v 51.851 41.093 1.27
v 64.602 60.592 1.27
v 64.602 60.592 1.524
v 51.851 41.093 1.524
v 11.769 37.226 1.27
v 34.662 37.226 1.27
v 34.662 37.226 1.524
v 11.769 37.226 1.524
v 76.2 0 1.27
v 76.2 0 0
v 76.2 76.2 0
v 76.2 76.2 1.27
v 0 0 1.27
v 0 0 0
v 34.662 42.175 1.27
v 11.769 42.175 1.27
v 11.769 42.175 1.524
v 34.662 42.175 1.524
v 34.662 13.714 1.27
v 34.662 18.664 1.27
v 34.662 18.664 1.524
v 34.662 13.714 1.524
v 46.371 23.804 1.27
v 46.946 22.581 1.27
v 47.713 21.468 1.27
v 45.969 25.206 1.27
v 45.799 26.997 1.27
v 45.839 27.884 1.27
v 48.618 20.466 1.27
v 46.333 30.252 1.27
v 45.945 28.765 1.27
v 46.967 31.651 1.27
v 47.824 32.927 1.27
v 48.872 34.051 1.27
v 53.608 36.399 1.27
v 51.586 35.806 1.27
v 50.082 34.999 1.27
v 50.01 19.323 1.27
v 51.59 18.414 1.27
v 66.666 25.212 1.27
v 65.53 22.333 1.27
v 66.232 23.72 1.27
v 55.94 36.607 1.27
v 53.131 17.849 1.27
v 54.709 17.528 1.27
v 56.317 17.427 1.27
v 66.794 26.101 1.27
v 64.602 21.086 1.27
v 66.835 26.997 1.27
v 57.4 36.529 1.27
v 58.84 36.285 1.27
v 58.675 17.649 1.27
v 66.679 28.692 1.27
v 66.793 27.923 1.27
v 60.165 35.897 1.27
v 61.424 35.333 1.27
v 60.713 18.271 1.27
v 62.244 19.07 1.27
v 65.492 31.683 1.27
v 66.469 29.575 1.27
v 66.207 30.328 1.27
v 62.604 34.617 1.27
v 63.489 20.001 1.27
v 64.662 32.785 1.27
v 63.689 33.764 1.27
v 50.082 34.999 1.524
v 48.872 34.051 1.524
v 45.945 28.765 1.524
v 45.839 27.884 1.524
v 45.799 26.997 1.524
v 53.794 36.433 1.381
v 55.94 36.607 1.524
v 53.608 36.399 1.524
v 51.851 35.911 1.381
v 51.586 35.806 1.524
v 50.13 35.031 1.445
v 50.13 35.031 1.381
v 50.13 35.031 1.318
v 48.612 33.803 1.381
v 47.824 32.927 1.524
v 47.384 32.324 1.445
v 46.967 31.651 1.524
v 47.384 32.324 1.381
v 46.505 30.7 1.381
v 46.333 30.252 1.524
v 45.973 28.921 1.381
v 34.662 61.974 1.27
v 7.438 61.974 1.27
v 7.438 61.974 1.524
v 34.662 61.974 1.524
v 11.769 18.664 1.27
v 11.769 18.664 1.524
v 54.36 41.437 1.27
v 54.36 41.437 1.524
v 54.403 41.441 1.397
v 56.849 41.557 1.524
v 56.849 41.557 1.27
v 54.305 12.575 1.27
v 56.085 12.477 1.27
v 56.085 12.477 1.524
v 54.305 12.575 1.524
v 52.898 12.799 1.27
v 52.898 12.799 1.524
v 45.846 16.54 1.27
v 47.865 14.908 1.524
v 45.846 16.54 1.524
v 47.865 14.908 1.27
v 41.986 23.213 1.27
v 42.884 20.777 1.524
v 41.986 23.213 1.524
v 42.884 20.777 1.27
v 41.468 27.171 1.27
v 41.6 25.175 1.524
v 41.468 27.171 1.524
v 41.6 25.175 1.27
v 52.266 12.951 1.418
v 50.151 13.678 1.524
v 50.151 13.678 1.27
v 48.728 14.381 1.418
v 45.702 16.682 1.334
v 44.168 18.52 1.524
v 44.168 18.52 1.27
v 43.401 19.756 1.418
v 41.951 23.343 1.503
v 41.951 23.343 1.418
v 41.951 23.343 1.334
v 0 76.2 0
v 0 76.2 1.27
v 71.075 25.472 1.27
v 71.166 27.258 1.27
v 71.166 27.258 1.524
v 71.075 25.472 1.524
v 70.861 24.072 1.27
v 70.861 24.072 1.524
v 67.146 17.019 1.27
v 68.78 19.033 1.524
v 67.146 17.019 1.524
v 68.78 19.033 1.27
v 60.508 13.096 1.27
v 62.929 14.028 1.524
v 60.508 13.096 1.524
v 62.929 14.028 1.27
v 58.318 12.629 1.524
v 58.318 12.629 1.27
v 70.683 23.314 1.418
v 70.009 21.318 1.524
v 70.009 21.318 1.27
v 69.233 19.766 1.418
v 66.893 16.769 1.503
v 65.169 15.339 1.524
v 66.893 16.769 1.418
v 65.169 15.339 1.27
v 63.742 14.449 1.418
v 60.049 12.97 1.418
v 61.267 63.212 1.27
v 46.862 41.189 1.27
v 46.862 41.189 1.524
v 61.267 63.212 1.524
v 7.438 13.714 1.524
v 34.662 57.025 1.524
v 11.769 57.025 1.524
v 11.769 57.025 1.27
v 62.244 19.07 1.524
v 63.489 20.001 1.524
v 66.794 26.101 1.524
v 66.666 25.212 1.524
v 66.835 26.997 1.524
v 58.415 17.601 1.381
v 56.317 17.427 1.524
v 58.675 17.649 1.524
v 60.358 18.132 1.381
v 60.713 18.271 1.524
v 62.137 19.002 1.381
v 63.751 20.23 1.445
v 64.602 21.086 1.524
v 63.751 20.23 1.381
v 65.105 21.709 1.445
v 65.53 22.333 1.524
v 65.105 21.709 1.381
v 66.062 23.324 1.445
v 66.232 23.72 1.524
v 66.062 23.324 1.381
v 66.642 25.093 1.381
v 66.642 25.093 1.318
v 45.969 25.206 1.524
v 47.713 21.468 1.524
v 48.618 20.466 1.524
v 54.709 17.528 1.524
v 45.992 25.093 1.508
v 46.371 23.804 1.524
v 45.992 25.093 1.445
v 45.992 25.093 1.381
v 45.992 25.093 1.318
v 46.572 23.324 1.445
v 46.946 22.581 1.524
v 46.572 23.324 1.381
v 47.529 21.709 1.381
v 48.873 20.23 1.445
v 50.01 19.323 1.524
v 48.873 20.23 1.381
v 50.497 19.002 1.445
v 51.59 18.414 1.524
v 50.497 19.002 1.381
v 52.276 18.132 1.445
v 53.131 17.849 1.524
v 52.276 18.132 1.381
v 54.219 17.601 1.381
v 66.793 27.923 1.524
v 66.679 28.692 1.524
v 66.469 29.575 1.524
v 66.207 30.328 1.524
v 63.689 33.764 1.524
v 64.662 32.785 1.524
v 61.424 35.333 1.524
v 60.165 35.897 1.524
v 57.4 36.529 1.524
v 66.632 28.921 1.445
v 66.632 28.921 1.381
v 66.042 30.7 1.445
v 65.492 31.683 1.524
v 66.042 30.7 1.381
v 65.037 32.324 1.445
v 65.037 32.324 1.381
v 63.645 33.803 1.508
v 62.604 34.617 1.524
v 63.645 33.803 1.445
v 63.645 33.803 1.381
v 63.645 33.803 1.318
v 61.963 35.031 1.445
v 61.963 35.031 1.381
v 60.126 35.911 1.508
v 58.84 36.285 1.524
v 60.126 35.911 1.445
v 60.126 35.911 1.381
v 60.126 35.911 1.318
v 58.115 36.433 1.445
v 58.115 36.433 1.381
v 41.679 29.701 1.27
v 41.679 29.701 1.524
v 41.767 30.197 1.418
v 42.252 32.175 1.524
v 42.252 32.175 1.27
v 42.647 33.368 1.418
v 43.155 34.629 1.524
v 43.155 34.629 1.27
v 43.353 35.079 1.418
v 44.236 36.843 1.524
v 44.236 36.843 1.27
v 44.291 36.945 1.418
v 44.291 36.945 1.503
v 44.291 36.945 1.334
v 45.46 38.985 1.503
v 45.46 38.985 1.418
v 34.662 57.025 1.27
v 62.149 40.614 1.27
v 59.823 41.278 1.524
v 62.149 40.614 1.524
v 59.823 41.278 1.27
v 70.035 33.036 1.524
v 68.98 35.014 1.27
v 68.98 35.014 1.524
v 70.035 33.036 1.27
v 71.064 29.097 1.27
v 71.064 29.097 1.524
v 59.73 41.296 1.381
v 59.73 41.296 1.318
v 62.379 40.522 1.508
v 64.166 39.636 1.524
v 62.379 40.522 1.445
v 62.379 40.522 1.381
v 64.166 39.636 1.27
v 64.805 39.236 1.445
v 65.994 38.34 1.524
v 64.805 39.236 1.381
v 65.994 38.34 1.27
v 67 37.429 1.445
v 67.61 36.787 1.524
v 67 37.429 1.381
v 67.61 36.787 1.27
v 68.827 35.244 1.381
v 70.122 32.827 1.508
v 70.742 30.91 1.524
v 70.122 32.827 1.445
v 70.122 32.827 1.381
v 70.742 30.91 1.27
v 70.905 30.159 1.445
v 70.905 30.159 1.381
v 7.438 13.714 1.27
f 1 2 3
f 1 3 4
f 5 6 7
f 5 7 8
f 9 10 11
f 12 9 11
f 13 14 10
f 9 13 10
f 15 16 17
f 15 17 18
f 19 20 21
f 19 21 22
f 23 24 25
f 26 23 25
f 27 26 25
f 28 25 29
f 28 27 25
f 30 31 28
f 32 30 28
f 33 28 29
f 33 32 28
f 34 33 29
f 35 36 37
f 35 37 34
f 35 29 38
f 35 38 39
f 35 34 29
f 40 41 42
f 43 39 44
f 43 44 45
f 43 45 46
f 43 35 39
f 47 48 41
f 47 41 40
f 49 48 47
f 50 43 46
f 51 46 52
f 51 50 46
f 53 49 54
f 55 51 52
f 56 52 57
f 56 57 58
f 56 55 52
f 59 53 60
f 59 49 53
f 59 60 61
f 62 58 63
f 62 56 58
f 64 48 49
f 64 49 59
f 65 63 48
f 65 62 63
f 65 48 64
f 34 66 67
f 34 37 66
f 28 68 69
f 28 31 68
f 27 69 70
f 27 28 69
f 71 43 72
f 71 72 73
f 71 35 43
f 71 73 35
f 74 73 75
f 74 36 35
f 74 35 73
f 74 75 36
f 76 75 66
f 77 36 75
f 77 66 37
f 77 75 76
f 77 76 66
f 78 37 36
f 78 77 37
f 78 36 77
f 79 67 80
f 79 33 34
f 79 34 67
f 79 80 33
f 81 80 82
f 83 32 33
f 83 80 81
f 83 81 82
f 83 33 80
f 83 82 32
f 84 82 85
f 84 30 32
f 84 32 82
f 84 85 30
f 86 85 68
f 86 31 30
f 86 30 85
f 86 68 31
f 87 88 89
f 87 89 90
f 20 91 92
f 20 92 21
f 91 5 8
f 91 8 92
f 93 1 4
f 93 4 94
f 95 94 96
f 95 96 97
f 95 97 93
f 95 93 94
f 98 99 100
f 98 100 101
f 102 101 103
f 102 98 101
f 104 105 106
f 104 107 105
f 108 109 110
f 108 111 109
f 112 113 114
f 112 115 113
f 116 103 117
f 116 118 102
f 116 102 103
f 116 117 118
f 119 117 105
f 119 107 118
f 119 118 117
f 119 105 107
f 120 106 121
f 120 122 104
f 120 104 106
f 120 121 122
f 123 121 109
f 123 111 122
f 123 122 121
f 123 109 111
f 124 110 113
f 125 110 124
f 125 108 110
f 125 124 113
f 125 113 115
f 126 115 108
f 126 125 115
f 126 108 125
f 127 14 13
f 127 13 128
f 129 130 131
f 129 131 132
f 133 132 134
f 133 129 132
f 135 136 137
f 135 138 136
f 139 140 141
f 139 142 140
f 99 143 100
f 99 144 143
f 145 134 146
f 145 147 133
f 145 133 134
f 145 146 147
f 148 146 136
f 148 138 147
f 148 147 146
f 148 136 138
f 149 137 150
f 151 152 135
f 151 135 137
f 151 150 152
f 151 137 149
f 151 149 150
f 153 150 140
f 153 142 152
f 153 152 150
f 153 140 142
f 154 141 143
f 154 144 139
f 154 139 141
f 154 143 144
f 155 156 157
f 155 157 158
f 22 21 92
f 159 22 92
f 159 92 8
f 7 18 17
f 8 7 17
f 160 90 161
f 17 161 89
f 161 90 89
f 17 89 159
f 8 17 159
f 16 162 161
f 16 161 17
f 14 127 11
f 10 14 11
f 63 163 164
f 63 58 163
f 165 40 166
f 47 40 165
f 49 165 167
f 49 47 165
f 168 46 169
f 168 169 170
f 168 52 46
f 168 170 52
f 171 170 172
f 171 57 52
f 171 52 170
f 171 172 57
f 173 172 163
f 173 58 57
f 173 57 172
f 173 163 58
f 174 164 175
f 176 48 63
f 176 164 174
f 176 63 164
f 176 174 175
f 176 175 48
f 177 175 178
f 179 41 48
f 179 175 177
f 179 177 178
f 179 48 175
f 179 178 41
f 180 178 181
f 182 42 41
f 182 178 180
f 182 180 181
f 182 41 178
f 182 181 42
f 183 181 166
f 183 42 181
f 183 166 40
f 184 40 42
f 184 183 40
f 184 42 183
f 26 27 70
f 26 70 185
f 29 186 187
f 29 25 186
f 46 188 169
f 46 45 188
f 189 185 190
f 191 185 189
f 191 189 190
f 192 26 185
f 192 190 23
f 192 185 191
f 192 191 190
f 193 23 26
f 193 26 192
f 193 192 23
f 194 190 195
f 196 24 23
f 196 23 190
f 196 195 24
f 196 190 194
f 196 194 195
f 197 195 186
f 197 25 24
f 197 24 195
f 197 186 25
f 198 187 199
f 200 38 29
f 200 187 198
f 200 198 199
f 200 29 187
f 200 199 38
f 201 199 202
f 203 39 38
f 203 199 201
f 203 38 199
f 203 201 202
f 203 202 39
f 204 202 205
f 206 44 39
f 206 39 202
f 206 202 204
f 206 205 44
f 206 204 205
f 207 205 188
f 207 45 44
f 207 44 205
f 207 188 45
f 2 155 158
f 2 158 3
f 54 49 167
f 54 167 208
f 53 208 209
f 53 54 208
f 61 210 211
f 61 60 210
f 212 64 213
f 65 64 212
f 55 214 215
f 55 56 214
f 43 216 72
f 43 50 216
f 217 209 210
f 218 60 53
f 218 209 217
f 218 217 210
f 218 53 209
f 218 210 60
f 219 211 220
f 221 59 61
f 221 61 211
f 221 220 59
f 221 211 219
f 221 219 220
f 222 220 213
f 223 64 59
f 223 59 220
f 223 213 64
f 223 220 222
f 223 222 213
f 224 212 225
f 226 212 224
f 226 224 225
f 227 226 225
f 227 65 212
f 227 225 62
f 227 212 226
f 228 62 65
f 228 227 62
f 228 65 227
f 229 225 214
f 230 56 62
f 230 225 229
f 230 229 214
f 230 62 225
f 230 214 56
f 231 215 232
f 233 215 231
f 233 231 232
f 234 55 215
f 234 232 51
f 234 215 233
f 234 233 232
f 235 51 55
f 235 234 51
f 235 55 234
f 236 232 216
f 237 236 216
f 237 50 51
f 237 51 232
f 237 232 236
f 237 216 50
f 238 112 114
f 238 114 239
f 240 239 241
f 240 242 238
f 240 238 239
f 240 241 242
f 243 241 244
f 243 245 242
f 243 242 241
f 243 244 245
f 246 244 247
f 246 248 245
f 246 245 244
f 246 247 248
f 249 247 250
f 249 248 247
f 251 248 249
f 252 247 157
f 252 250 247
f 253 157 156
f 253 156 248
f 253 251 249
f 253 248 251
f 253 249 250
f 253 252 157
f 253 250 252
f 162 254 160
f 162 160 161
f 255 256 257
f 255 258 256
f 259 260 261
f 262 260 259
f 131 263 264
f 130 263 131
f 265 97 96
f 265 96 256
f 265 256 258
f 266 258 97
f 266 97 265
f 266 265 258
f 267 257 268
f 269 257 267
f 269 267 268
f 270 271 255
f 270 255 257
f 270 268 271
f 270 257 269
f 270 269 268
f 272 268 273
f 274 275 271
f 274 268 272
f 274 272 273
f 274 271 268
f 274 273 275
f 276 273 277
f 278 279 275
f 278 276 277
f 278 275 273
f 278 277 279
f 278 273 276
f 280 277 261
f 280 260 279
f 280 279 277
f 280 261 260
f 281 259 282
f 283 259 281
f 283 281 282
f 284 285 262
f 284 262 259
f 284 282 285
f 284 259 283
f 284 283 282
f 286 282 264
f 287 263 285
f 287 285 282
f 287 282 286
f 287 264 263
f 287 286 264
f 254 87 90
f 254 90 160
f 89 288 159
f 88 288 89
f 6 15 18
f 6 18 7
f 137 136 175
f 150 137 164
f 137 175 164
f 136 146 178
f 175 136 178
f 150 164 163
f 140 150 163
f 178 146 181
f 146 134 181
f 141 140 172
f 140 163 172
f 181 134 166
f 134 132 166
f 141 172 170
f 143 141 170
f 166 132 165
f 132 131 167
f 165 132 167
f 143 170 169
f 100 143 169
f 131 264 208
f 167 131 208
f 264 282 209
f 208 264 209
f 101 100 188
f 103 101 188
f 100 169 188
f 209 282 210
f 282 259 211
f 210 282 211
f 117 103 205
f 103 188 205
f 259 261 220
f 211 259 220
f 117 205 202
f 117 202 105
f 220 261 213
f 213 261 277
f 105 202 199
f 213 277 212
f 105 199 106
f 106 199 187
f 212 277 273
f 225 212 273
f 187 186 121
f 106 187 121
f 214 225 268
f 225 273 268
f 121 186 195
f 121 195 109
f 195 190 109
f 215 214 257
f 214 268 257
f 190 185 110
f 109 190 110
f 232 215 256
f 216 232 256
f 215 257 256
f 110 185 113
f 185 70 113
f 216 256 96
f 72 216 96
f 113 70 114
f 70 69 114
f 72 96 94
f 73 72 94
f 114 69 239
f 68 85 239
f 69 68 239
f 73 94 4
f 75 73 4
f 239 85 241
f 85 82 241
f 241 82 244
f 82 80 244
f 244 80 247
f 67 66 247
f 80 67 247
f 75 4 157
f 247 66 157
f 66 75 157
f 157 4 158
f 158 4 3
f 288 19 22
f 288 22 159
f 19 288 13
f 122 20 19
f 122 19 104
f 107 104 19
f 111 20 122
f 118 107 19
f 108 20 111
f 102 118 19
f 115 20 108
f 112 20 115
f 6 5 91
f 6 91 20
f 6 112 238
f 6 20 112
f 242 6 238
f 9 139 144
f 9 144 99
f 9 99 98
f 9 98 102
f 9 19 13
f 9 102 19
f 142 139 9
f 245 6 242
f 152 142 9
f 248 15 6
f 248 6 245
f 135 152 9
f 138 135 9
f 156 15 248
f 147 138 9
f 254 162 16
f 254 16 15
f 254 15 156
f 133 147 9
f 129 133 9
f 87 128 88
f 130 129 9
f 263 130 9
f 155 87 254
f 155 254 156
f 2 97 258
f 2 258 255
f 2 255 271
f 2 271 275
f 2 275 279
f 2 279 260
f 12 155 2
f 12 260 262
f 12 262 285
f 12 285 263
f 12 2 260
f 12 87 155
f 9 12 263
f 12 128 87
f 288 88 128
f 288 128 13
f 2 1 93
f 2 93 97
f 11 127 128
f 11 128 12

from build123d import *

# Parameters (mm, degrees)
SKETCH1_W           = 76.2
SKETCH1_H           = 76.2
BOSS_EXTRUDE1_DEPTH = 1.27
BOSS_EXTRUDE2_DEPTH = 0.254


with BuildPart() as part:
    # Sketch1 → Boss-Extrude1 (new body)
    with BuildSketch(Plane.XY):
        with Locations((38.1, 38.1)):
            Rectangle(SKETCH1_W, SKETCH1_H)
    extrude(amount=BOSS_EXTRUDE1_DEPTH)

    # Sketch2 → Boss-Extrude2 (add)
    # profile 1 of 2: a face of its own
    with BuildSketch(Plane.XY.offset(1.27)):
        Polygon((7.438286123, 61.974293726), (34.661875867, 61.974293726), (34.661875867, 57.024550136), (11.769311764, 57.024550136), (11.769311764, 42.175319367), (34.661875867, 42.175319367), (34.661875867, 37.225575777), (11.769311764, 37.225575777), (11.769311764, 18.664037315), (34.661875867, 18.664037315), (34.661875867, 13.714293726), (7.438286123, 13.714293726), align=None)
    # profile 2 of 2: a face of its own
    with BuildSketch(Plane.XY.offset(1.27)):
        with BuildLine():
            Line((61.266747661, 63.211729623), (64.602024104, 60.591845809))
            Line((64.602024104, 60.591845809), (51.850633879, 41.092562956))
            add(Edge.make_bspline(
                [(51.850633879, 41.092562956), (52.699600041, 41.227882075), (54.35560453, 41.491837316), (56.031824605, 41.535380872), (56.848714809, 41.556601418)],
                knots=[0, 0, 0, 0, 1.025318673, 2, 2, 2, 2], degree=3))
            add(Edge.make_bspline(
                [(56.848714809, 41.556601418), (57.339208715, 41.543418004), (58.304731374, 41.517466845), (59.722290309, 41.317755235), (61.084448609, 41.003029549), (62.38556044, 40.544252671), (63.630295899, 39.958205922), (64.82579808, 39.255831671), (65.949594368, 38.400861918), (67.016156628, 37.445797128), (67.984487977, 36.387979507), (68.84180696, 35.265571362), (69.561939808, 34.079742071), (70.146215653, 32.831092257), (70.599926922, 31.521546684), (70.930682279, 30.152780852), (71.126198607, 28.723850905), (71.152748374, 27.752057551), (71.166234841, 27.258416322)],
                knots=[0, 0, 0, 0, 1.04369286, 2.054478336, 3.041073146, 4.015093852, 4.984733326, 5.965804835, 6.960378782, 7.985147595, 9.009457201, 10.008161701, 10.986880575, 11.956520048, 12.937015923, 13.931873656, 14.949455224, 16, 16, 16, 16], degree=3))
            add(Edge.make_bspline(
                [(71.166234841, 27.258416322), (71.146612258, 26.583056175), (71.107999657, 25.254107236), (70.723246173, 23.318512993), (70.125378614, 21.47453265), (69.270797037, 19.751606922), (68.20931995, 18.152097205), (66.914882058, 16.734832473), (65.433389845, 15.470833616), (63.75826045, 14.413848347), (61.955501751, 13.550641706), (60.061613924, 12.930635254), (58.094989329, 12.548919759), (56.760192076, 12.501065106), (56.084984841, 12.476857828)],
                knots=[0, 0, 0, 0, 1.031375318, 2.029502543, 3.004789286, 3.987476834, 4.960371455, 5.9300674, 6.912260825, 7.929083631, 8.949397511, 9.960523116, 10.96833055, 12, 12, 12, 12], degree=3))
            add(Edge.make_bspline(
                [(56.084984841, 12.476857828), (55.43558862, 12.497929602), (54.149248406, 12.539669097), (52.257004221, 12.911490858), (50.438801587, 13.514149366), (48.70737921, 14.344418247), (47.10348413, 15.393147799), (45.668567668, 16.655660825), (44.409784514, 18.104970192), (43.362203027, 19.740851094), (42.531321197, 21.49875548), (41.908216687, 23.331768956), (41.544250201, 25.233212704), (41.493390272, 26.522184069), (41.467773302, 27.17140911)],
                knots=[0, 0, 0, 0, 1.012016664, 2.004627821, 2.994792927, 3.992885782, 4.990978636, 5.973936114, 6.964471063, 7.975201453, 8.993600317, 9.990122807, 10.98767138, 12, 12, 12, 12], degree=3))
            add(Edge.make_bspline(
                [(41.467773302, 27.17140911), (41.484063741, 27.668412421), (41.517325705, 28.683198219), (41.749571996, 30.22012793), (42.122756852, 31.792729417), (42.540691849, 33.126831527), (42.98227926, 34.219734684), (43.349779706, 35.100872529), (43.80720172, 36.007623784), (44.294950113, 36.971081405), (44.856929112, 37.9664154), (45.467978609, 39.010260853), (46.144992652, 40.086016622), (46.619597525, 40.816041439), (46.862220418, 41.189237636)],
                knots=[0, 0, 0, 0, 1.173818275, 2.396712641, 3.66331629, 4.989737886, 5.693666774, 6.447286557, 7.243889047, 8.091586357, 8.998013824, 9.943181721, 10.948533338, 12, 12, 12, 12], degree=3))
            Line((46.862220418, 41.189237636), (61.266747661, 63.211729623))
        make_face()
        with BuildLine():
            add(Edge.make_bspline(
                [(55.939972822, 36.606857828), (55.572338554, 36.596129717), (54.854242034, 36.5751746), (53.800692939, 36.453486984), (52.803596506, 36.224333811), (51.849742657, 35.932480331), (50.956964331, 35.531190713), (50.118773071, 35.043739908), (49.331927527, 34.46984332), (48.604669296, 33.817631329), (47.945304453, 33.103548337), (47.377475489, 32.338702868), (46.887672338, 31.541527599), (46.489433316, 30.705361848), (46.1793273, 29.830525256), (45.955011361, 28.921041435), (45.830173065, 27.970811602), (45.809404284, 27.32643715), (45.798798943, 26.997394687)],
                knots=[0, 0, 0, 0, 1.129588631, 2.206414736, 3.251139165, 4.268635594, 5.265702196, 6.250456724, 7.242448911, 8.251968645, 9.246821453, 10.222880186, 11.173611482, 12.116736599, 13.062300278, 14.020270554, 14.989073742, 16, 16, 16, 16], degree=3))
            add(Edge.make_bspline(
                [(45.798798943, 26.997394687), (45.807435574, 26.67129525), (45.824370719, 26.031862801), (45.978145278, 25.089563143), (46.213034728, 24.182759006), (46.562442586, 23.316125246), (46.979228193, 22.476452015), (47.529465606, 21.694153479), (48.139151915, 20.921716741), (48.867932152, 20.21847931), (49.650066294, 19.564120257), (50.485670303, 18.992166819), (51.356555921, 18.502863182), (52.27448073, 18.119387876), (53.226421418, 17.804673567), (54.220309287, 17.583208713), (55.256835574, 17.458001231), (55.958976354, 17.437205396), (56.317004072, 17.426601418)],
                knots=[0, 0, 0, 0, 0.989467248, 1.94019797, 2.891935182, 3.827694429, 4.772920941, 5.730924762, 6.725747692, 7.756678648, 8.79901574, 9.819492441, 10.826891316, 11.826466727, 12.835195252, 13.867842842, 14.912794438, 16, 16, 16, 16], degree=3))
            add(Edge.make_bspline(
                [(56.317004072, 17.426601418), (56.675031203, 17.437206228), (57.377170832, 17.458003693), (58.413705458, 17.583199356), (59.407562503, 17.804707901), (60.359615219, 18.119263413), (61.277126494, 18.503324899), (62.147250454, 18.989122741), (62.974952109, 19.567637667), (63.757599691, 20.217361058), (64.483346509, 20.925719296), (65.107655503, 21.687258269), (65.641042027, 22.482774666), (66.074474561, 23.31281757), (66.420033966, 24.18328302), (66.65611454, 25.089422761), (66.809571535, 26.031899554), (66.826550316, 26.671307663), (66.8352092, 26.997394687)],
                knots=[0, 0, 0, 0, 1.087397944, 2.132534446, 3.165364764, 4.174271784, 5.174024072, 6.181601208, 7.194203697, 8.236725232, 9.267838612, 10.269026844, 11.221737037, 12.171628256, 13.107553087, 14.05945871, 15.010357665, 16, 16, 16, 16], degree=3))
            add(Edge.make_bspline(
                [(66.8352092, 26.997394687), (66.827621446, 27.326866409), (66.812729152, 27.97351225), (66.644288672, 28.92061638), (66.41067754, 29.835146224), (66.057924094, 30.711354081), (65.599639622, 31.545782266), (65.041431273, 32.342645883), (64.395677032, 33.108054272), (63.649749243, 33.819031738), (62.837737046, 34.46912259), (61.974357575, 35.042996816), (61.0710962, 35.527320066), (60.128868754, 35.931423139), (59.136879177, 36.223044174), (58.111142672, 36.452668606), (57.038540143, 36.57486317), (56.31082611, 36.596057103), (55.939972822, 36.606857828)],
                knots=[0, 0, 0, 0, 0.978206639, 1.919901502, 2.851605144, 3.780102724, 4.718870031, 5.675451981, 6.667674623, 7.690630536, 8.733308323, 9.756129687, 10.767539656, 11.776269907, 12.797430371, 13.836405707, 14.897401972, 16, 16, 16, 16], degree=3))
        make_face(mode=Mode.SUBTRACT)
    extrude(amount=BOSS_EXTRUDE2_DEPTH)


solid = part.part
